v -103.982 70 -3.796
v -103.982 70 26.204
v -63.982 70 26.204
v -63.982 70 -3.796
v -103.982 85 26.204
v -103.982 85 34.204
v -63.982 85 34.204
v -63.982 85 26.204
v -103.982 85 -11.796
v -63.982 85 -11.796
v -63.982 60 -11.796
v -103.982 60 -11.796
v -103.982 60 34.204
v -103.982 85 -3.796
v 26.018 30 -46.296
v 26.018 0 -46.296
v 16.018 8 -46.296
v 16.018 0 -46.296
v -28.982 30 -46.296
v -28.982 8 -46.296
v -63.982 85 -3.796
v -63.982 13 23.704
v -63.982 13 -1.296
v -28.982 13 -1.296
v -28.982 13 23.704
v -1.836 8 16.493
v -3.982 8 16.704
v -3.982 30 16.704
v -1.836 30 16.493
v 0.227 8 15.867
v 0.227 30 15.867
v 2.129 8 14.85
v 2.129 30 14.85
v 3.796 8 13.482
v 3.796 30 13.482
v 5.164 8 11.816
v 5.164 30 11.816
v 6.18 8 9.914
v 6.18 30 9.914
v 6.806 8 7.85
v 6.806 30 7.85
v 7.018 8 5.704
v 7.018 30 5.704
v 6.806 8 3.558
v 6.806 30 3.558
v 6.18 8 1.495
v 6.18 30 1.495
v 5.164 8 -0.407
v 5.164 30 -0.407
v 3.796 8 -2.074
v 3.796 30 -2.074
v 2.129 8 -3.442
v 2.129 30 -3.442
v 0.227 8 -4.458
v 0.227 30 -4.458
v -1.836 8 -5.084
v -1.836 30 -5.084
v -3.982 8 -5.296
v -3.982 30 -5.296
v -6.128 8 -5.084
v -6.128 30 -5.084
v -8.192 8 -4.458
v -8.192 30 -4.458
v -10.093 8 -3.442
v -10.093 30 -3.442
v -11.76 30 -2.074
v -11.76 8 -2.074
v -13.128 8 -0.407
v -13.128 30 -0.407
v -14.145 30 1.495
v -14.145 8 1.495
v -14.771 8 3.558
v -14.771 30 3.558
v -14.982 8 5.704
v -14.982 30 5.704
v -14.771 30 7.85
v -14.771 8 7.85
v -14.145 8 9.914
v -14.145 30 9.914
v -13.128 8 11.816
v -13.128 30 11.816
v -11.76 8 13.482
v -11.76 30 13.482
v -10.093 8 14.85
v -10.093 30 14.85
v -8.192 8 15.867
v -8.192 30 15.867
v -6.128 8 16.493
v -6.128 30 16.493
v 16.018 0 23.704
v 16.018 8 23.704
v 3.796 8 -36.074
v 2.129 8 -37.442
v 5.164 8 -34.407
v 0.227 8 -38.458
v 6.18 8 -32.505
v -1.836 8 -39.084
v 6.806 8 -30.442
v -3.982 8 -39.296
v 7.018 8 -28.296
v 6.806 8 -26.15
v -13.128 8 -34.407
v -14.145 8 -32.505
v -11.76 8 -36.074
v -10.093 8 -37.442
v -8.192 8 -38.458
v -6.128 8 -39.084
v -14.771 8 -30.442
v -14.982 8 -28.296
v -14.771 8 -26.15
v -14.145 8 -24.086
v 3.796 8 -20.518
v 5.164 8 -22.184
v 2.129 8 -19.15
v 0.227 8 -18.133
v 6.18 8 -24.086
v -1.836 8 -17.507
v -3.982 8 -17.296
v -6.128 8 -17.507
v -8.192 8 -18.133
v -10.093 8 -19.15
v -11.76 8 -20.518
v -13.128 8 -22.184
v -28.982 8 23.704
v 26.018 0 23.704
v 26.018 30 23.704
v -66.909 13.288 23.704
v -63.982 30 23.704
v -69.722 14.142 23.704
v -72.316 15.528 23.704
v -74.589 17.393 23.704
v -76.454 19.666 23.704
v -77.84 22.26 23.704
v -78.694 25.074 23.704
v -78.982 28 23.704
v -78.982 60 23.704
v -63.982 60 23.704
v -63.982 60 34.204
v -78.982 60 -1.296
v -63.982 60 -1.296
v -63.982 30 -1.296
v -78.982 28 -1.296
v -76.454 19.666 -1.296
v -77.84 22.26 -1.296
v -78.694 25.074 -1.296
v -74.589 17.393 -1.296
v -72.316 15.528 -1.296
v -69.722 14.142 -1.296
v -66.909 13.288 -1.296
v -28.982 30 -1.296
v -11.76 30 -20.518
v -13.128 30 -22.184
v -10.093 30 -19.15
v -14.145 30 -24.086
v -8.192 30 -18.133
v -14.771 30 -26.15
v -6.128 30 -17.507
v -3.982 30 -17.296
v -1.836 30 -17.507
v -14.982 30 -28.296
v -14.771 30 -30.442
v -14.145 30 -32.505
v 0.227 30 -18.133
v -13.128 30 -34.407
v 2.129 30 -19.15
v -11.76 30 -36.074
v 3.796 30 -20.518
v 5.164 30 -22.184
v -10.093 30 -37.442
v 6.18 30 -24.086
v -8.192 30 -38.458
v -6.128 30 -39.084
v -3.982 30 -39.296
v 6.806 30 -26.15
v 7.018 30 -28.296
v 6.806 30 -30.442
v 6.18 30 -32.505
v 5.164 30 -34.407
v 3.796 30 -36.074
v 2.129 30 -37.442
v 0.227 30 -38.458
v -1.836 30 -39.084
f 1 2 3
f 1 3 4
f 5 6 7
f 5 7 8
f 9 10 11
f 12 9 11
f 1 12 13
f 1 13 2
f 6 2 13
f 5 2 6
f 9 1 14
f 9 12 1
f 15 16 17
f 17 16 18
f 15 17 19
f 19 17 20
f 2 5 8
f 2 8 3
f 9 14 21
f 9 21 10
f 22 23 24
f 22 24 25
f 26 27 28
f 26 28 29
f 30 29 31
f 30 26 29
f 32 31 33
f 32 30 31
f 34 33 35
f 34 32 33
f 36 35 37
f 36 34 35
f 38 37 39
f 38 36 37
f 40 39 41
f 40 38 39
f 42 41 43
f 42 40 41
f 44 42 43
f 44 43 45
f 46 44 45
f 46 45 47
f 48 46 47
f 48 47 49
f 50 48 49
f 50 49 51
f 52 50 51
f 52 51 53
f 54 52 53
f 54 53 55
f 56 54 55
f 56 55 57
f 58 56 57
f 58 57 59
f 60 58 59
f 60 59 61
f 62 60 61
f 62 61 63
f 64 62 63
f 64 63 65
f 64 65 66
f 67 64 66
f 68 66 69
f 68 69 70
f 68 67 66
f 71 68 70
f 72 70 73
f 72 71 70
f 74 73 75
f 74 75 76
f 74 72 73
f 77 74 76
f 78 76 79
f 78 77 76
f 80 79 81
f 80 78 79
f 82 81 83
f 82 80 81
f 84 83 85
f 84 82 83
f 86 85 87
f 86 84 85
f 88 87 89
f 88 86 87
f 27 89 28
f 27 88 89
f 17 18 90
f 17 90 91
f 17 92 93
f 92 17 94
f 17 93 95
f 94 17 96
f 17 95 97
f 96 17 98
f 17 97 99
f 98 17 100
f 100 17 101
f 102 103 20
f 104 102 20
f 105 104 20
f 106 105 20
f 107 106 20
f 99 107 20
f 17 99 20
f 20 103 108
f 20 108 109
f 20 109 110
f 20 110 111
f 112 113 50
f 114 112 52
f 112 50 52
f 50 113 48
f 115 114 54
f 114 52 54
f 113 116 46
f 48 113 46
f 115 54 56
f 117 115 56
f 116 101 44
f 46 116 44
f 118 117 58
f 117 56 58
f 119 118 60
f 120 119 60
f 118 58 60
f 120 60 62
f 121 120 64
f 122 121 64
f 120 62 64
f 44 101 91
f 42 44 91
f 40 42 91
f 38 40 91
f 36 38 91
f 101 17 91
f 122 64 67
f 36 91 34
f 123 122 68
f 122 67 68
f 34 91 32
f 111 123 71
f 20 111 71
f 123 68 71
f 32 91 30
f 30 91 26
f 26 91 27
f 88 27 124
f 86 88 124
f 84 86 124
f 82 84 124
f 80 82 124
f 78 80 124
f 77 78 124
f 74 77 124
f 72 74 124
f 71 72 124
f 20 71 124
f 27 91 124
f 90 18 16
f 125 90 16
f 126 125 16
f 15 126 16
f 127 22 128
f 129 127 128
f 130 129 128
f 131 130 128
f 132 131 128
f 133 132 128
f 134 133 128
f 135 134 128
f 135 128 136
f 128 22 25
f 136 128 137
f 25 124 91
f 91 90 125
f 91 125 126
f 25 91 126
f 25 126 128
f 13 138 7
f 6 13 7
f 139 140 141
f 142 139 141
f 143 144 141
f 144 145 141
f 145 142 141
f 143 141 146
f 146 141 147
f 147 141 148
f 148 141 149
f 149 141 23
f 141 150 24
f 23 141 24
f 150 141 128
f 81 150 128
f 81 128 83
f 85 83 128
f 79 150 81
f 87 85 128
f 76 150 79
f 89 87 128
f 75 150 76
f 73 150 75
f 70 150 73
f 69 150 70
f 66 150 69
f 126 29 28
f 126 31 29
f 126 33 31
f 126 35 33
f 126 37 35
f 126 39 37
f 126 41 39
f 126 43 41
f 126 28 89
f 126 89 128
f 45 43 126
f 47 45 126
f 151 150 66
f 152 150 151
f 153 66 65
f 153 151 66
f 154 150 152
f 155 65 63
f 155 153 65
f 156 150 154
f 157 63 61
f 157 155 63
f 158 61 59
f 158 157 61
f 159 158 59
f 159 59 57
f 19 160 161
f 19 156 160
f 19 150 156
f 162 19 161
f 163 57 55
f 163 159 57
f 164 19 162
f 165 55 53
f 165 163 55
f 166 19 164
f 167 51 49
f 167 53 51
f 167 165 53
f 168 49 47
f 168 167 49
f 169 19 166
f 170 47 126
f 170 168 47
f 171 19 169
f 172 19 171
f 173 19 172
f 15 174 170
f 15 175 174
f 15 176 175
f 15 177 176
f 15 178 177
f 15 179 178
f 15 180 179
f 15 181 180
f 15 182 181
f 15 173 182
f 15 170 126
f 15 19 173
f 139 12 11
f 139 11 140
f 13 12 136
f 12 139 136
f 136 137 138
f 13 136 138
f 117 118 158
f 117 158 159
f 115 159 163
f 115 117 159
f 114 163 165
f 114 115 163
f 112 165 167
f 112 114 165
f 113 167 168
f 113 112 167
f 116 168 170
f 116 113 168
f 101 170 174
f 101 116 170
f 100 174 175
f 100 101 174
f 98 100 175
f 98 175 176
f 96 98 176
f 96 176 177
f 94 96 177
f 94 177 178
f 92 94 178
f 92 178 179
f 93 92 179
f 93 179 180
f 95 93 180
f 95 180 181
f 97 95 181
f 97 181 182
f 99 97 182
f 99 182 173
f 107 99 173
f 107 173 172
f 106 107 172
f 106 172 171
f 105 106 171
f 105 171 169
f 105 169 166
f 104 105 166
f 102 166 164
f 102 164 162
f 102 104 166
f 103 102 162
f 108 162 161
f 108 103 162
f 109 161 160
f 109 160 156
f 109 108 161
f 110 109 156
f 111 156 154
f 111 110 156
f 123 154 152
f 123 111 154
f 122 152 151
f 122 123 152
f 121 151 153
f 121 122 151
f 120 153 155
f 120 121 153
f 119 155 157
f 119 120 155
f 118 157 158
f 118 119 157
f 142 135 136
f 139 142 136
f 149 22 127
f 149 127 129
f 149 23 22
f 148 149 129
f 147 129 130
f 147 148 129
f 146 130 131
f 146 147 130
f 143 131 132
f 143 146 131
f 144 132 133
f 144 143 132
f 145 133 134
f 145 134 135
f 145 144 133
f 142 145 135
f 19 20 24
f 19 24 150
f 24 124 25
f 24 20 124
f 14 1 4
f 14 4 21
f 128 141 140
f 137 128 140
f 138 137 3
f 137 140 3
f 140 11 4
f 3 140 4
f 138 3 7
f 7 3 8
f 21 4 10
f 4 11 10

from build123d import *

# Parameters (mm, degrees)
SKETCH2_R           = 11
BOSS_EXTRUDE1_DEPTH = 30
CUT_EXTRUDE1_DEPTH  = 70
BOSS_EXTRUDE3_DEPTH = 40
CUT_EXTRUDE2_DEPTH  = 46
FILLET1_R           = 15


with BuildPart() as part:
    # Sketch2 → Boss-Extrude1 (new body)
    with BuildSketch(Plane(origin=(0, 0, 0), x_dir=(1, 0, 0), z_dir=(0, 1, 0))):
        Polygon((-63.982218383188474, 1.2957443941801692), (-63.98221838318849, -23.70425560581983), (26.017781616811508, -23.70425560581983), (26.017781616811508, 46.295744394180176), (-28.982218383188492, 46.29574439418017), (-28.982218383188492, 1.2957443941801692), align=None)
        with Locations(Location((-3.9822183831884903, -5.704255605819837, 0), (0, 0, 270))):
            Circle(SKETCH2_R, mode=Mode.SUBTRACT)
        with Locations(Location((-3.9822183831884903, 28.295744394180172, 0), (0, 0, 270))):
            Circle(SKETCH2_R, mode=Mode.SUBTRACT)
    extrude(amount=BOSS_EXTRUDE1_DEPTH)

    # Sketch3 → Cut-Extrude1 (cut)
    with BuildSketch(Plane.XY.offset(23.70425560581983)):
        Polygon((-63.98221838318849, 0), (16.01778161681151, 0), (16.017781616811508, 8), (-28.982218383188492, 7.999999999999995), (-28.982218383188492, 12.999999999999995), (-63.982218383188496, 12.999999999999995), align=None)
    extrude(amount=-CUT_EXTRUDE1_DEPTH, mode=Mode.SUBTRACT)

    # 3DSketch1 → Boss-Extrude3 (add)
    with BuildSketch(Plane(origin=(-63.98221838318849, 12.999999999999995, -1.2957443941801692), x_dir=(0, 0.8969047134125312, 0.4422238517520119), z_dir=(-1, 0, 0))):
        Polygon((0, 0), (11.055596293800297, -22.422617835313282), (53.21011782418927, -1.6380968029687248), (57.85346826758539, -11.055596293800305), (80.27608610289867, 0), (76.73829528888258, 7.1752377073002505), (63.28472458769462, 0.5418799310200721), (50.018009035134256, 27.449021333396008), (63.47157973632223, 34.08237910967619), (59.93378892230613, 41.25761681697644), (37.511171086992846, 30.20202052317613), (42.15452153038897, 20.784521032344557), align=None)
    extrude(amount=BOSS_EXTRUDE3_DEPTH)

    # Sketch4 → Cut-Extrude2 (cut)
    with BuildSketch(Plane.XY.offset(23.70425560581983)):
        Polygon((-103.9822183831885, 12.999999999999993), (-78.9822183831885, 13), (-78.9822183831885, 60), (-103.9822183831885, 60), align=None)
    extrude(amount=-CUT_EXTRUDE2_DEPTH, mode=Mode.SUBTRACT)

    # Fillet1
    fillet1_edges = [part.edges().sort_by_distance(p)[0] for p in [
        (-78.9822183831885, 13, 11.204255605819831),
    ]]
    fillet(fillet1_edges, radius=FILLET1_R)


solid = part.part
